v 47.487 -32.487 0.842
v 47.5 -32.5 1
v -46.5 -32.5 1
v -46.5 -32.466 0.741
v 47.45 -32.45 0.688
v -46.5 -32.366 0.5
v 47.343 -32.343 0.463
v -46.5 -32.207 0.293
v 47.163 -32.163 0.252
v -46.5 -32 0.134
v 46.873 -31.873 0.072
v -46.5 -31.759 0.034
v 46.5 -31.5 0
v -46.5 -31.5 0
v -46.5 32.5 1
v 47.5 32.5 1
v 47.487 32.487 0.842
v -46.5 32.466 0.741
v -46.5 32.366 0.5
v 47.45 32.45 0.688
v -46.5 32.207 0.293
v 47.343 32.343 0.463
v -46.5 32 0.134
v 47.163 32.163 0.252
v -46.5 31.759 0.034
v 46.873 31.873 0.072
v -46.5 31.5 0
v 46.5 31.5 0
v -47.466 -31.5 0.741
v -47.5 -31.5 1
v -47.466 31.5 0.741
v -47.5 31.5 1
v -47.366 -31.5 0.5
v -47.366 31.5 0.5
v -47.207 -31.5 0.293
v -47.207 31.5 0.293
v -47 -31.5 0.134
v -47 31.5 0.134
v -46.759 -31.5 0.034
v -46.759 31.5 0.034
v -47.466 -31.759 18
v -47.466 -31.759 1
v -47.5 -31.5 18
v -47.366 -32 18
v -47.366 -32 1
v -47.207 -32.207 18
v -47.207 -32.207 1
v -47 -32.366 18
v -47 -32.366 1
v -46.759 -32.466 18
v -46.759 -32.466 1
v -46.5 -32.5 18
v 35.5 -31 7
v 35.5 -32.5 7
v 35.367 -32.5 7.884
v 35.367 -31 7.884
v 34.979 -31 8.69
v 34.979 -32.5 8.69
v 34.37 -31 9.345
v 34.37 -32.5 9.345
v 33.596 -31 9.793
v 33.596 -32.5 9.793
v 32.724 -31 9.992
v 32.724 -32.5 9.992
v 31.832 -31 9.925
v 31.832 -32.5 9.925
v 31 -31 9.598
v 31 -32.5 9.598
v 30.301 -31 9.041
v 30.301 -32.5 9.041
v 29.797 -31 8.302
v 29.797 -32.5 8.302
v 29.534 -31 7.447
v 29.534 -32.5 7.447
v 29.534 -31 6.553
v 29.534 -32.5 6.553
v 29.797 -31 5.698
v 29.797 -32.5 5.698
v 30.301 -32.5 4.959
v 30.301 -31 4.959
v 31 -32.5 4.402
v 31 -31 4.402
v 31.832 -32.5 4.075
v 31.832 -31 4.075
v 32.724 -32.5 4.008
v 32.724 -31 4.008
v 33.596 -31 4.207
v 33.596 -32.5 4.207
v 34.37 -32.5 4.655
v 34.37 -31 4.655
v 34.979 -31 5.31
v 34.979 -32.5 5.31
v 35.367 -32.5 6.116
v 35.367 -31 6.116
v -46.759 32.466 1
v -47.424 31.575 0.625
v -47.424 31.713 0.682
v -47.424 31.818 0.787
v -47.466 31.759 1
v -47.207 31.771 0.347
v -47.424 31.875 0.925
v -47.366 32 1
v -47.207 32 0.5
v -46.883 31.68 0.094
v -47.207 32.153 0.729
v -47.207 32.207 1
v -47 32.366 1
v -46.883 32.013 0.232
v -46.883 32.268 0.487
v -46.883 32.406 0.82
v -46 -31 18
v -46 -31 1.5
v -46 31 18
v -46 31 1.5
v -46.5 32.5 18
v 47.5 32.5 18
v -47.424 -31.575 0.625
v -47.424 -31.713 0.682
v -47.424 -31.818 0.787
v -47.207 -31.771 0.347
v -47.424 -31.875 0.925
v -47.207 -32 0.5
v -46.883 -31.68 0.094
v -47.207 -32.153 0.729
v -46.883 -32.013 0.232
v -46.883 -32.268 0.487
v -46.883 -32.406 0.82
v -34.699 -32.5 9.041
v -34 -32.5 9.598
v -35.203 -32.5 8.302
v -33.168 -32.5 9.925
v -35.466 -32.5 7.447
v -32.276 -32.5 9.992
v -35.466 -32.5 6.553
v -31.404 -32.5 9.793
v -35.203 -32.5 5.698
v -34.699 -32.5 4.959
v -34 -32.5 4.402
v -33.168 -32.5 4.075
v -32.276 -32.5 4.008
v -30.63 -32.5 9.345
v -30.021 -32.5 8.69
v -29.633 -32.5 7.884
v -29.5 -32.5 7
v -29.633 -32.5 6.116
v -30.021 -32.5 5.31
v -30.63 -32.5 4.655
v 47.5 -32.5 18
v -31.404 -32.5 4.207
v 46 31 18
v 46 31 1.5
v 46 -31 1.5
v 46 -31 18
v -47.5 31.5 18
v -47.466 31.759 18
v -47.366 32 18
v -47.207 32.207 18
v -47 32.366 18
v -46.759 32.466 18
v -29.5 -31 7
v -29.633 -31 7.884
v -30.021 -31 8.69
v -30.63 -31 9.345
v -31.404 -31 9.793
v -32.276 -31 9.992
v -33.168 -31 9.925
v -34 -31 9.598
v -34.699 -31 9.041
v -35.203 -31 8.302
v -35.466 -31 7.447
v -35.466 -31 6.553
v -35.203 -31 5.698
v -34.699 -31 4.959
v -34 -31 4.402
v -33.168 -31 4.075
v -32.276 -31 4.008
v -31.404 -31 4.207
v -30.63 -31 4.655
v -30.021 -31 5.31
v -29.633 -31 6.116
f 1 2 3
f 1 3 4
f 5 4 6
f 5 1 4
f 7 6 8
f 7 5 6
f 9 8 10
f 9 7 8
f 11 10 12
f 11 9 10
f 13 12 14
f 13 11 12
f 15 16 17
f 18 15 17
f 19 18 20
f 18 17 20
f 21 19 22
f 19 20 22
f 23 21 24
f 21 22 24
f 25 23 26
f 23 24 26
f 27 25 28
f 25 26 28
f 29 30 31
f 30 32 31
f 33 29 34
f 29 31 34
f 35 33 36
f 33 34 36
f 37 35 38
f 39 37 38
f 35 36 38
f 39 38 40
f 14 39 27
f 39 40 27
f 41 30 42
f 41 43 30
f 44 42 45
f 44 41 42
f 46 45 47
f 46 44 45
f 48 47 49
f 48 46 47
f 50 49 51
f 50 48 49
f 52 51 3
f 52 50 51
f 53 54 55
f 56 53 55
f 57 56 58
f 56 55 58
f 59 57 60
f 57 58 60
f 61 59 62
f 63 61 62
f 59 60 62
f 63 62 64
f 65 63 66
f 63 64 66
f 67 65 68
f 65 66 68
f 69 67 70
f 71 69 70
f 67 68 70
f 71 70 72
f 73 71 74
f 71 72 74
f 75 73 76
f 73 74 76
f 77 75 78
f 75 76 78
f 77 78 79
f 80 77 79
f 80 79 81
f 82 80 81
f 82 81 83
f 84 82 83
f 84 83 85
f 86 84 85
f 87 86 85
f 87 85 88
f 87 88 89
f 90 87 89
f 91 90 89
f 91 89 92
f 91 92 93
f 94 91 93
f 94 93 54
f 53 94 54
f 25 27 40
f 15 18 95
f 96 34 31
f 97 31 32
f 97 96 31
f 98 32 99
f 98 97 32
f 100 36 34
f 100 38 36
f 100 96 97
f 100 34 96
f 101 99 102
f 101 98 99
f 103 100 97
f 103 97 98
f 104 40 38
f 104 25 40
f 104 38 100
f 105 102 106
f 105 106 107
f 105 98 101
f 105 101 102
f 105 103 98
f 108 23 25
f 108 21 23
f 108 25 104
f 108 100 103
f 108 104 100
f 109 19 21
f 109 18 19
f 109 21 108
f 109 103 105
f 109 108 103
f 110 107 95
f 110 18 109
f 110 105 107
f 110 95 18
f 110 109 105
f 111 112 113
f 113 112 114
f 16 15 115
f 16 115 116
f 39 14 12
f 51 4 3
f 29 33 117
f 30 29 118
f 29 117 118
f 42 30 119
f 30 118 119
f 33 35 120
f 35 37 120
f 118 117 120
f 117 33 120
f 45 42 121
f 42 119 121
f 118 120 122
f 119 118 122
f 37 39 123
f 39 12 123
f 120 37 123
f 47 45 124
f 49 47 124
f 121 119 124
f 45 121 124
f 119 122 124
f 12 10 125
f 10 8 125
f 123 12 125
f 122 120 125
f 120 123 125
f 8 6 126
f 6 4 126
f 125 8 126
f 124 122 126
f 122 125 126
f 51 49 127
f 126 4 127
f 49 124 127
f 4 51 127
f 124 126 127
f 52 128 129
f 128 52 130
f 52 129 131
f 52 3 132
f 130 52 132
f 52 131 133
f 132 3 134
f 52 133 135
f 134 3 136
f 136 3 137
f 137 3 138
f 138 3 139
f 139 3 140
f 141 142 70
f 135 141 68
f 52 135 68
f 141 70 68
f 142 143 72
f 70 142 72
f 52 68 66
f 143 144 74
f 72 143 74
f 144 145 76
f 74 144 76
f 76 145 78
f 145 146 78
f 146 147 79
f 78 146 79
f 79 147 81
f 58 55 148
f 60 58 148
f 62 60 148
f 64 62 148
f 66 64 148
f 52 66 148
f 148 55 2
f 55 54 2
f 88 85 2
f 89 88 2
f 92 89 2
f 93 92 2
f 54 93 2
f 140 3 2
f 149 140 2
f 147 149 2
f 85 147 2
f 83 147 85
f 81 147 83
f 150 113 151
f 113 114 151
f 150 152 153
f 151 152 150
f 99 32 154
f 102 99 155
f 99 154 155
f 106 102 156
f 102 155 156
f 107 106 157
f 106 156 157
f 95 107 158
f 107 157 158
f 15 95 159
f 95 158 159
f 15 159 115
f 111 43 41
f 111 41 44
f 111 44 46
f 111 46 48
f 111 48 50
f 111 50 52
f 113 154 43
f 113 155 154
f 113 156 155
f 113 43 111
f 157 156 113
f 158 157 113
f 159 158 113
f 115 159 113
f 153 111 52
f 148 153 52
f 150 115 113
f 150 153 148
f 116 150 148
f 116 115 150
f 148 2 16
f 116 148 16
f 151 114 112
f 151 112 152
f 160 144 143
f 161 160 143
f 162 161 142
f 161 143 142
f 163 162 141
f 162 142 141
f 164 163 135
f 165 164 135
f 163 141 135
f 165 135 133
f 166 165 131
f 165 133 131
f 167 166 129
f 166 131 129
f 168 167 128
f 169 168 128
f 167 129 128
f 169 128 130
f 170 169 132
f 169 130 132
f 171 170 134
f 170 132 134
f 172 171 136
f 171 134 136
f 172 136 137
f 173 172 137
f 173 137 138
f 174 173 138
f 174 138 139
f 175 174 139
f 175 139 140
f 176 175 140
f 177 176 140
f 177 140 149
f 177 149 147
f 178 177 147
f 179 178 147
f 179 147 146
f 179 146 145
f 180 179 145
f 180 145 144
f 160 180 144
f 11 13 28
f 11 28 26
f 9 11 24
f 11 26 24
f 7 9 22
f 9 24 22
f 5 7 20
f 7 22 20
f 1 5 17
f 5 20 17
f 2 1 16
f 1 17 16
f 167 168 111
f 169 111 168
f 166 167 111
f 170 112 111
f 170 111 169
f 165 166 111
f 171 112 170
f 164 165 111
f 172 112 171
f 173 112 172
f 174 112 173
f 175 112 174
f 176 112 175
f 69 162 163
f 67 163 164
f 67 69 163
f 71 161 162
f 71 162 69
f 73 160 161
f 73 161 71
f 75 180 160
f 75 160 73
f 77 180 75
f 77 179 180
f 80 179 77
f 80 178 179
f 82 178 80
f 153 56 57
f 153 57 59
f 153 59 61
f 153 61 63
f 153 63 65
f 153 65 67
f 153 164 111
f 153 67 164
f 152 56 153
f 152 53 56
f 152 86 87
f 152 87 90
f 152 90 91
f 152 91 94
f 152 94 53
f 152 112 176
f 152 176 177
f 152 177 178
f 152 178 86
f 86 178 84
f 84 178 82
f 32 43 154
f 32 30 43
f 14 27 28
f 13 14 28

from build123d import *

# Parameters (mm, degrees)
F0_W     = 95
F0_H     = 65
F1_DEPTH = 18
F2_T     = -1.5
F3_R     = 3
F4_DEPTH = 10
F5_R     = 1


with BuildPart() as f1:
    # F0 (on Top) → F1 (new body)
    with BuildSketch(Plane.XY):
        Rectangle(F0_W, F0_H)
    extrude(amount=F1_DEPTH)

    # F2
    f2_openings = [f1.faces().sort_by_distance(p)[0] for p in [
        (0, 0, 18),
    ]]
    offset(amount=F2_T, openings=f2_openings)

    # F3 (on face) → F4 (cut)
    with BuildSketch(Plane.XZ.offset(32.5)):
        with Locations((-32.5, 7)):
            Circle(F3_R)
        with Locations((32.5, 7)):
            Circle(F3_R)
    extrude(amount=-F4_DEPTH, mode=Mode.SUBTRACT)

    # F5
    f5_edges = [f1.edges().sort_by_distance(p)[0] for p in [
        (47.5, 0, 0),
        (0, 32.5, 0),
        (0, -32.5, 0),
        (-47.5, 0, 0),
        (-47.5, -32.5, 9),
        (-47.5, 32.5, 9),
    ]]
    fillet(f5_edges, radius=F5_R)


solid = f1.part
